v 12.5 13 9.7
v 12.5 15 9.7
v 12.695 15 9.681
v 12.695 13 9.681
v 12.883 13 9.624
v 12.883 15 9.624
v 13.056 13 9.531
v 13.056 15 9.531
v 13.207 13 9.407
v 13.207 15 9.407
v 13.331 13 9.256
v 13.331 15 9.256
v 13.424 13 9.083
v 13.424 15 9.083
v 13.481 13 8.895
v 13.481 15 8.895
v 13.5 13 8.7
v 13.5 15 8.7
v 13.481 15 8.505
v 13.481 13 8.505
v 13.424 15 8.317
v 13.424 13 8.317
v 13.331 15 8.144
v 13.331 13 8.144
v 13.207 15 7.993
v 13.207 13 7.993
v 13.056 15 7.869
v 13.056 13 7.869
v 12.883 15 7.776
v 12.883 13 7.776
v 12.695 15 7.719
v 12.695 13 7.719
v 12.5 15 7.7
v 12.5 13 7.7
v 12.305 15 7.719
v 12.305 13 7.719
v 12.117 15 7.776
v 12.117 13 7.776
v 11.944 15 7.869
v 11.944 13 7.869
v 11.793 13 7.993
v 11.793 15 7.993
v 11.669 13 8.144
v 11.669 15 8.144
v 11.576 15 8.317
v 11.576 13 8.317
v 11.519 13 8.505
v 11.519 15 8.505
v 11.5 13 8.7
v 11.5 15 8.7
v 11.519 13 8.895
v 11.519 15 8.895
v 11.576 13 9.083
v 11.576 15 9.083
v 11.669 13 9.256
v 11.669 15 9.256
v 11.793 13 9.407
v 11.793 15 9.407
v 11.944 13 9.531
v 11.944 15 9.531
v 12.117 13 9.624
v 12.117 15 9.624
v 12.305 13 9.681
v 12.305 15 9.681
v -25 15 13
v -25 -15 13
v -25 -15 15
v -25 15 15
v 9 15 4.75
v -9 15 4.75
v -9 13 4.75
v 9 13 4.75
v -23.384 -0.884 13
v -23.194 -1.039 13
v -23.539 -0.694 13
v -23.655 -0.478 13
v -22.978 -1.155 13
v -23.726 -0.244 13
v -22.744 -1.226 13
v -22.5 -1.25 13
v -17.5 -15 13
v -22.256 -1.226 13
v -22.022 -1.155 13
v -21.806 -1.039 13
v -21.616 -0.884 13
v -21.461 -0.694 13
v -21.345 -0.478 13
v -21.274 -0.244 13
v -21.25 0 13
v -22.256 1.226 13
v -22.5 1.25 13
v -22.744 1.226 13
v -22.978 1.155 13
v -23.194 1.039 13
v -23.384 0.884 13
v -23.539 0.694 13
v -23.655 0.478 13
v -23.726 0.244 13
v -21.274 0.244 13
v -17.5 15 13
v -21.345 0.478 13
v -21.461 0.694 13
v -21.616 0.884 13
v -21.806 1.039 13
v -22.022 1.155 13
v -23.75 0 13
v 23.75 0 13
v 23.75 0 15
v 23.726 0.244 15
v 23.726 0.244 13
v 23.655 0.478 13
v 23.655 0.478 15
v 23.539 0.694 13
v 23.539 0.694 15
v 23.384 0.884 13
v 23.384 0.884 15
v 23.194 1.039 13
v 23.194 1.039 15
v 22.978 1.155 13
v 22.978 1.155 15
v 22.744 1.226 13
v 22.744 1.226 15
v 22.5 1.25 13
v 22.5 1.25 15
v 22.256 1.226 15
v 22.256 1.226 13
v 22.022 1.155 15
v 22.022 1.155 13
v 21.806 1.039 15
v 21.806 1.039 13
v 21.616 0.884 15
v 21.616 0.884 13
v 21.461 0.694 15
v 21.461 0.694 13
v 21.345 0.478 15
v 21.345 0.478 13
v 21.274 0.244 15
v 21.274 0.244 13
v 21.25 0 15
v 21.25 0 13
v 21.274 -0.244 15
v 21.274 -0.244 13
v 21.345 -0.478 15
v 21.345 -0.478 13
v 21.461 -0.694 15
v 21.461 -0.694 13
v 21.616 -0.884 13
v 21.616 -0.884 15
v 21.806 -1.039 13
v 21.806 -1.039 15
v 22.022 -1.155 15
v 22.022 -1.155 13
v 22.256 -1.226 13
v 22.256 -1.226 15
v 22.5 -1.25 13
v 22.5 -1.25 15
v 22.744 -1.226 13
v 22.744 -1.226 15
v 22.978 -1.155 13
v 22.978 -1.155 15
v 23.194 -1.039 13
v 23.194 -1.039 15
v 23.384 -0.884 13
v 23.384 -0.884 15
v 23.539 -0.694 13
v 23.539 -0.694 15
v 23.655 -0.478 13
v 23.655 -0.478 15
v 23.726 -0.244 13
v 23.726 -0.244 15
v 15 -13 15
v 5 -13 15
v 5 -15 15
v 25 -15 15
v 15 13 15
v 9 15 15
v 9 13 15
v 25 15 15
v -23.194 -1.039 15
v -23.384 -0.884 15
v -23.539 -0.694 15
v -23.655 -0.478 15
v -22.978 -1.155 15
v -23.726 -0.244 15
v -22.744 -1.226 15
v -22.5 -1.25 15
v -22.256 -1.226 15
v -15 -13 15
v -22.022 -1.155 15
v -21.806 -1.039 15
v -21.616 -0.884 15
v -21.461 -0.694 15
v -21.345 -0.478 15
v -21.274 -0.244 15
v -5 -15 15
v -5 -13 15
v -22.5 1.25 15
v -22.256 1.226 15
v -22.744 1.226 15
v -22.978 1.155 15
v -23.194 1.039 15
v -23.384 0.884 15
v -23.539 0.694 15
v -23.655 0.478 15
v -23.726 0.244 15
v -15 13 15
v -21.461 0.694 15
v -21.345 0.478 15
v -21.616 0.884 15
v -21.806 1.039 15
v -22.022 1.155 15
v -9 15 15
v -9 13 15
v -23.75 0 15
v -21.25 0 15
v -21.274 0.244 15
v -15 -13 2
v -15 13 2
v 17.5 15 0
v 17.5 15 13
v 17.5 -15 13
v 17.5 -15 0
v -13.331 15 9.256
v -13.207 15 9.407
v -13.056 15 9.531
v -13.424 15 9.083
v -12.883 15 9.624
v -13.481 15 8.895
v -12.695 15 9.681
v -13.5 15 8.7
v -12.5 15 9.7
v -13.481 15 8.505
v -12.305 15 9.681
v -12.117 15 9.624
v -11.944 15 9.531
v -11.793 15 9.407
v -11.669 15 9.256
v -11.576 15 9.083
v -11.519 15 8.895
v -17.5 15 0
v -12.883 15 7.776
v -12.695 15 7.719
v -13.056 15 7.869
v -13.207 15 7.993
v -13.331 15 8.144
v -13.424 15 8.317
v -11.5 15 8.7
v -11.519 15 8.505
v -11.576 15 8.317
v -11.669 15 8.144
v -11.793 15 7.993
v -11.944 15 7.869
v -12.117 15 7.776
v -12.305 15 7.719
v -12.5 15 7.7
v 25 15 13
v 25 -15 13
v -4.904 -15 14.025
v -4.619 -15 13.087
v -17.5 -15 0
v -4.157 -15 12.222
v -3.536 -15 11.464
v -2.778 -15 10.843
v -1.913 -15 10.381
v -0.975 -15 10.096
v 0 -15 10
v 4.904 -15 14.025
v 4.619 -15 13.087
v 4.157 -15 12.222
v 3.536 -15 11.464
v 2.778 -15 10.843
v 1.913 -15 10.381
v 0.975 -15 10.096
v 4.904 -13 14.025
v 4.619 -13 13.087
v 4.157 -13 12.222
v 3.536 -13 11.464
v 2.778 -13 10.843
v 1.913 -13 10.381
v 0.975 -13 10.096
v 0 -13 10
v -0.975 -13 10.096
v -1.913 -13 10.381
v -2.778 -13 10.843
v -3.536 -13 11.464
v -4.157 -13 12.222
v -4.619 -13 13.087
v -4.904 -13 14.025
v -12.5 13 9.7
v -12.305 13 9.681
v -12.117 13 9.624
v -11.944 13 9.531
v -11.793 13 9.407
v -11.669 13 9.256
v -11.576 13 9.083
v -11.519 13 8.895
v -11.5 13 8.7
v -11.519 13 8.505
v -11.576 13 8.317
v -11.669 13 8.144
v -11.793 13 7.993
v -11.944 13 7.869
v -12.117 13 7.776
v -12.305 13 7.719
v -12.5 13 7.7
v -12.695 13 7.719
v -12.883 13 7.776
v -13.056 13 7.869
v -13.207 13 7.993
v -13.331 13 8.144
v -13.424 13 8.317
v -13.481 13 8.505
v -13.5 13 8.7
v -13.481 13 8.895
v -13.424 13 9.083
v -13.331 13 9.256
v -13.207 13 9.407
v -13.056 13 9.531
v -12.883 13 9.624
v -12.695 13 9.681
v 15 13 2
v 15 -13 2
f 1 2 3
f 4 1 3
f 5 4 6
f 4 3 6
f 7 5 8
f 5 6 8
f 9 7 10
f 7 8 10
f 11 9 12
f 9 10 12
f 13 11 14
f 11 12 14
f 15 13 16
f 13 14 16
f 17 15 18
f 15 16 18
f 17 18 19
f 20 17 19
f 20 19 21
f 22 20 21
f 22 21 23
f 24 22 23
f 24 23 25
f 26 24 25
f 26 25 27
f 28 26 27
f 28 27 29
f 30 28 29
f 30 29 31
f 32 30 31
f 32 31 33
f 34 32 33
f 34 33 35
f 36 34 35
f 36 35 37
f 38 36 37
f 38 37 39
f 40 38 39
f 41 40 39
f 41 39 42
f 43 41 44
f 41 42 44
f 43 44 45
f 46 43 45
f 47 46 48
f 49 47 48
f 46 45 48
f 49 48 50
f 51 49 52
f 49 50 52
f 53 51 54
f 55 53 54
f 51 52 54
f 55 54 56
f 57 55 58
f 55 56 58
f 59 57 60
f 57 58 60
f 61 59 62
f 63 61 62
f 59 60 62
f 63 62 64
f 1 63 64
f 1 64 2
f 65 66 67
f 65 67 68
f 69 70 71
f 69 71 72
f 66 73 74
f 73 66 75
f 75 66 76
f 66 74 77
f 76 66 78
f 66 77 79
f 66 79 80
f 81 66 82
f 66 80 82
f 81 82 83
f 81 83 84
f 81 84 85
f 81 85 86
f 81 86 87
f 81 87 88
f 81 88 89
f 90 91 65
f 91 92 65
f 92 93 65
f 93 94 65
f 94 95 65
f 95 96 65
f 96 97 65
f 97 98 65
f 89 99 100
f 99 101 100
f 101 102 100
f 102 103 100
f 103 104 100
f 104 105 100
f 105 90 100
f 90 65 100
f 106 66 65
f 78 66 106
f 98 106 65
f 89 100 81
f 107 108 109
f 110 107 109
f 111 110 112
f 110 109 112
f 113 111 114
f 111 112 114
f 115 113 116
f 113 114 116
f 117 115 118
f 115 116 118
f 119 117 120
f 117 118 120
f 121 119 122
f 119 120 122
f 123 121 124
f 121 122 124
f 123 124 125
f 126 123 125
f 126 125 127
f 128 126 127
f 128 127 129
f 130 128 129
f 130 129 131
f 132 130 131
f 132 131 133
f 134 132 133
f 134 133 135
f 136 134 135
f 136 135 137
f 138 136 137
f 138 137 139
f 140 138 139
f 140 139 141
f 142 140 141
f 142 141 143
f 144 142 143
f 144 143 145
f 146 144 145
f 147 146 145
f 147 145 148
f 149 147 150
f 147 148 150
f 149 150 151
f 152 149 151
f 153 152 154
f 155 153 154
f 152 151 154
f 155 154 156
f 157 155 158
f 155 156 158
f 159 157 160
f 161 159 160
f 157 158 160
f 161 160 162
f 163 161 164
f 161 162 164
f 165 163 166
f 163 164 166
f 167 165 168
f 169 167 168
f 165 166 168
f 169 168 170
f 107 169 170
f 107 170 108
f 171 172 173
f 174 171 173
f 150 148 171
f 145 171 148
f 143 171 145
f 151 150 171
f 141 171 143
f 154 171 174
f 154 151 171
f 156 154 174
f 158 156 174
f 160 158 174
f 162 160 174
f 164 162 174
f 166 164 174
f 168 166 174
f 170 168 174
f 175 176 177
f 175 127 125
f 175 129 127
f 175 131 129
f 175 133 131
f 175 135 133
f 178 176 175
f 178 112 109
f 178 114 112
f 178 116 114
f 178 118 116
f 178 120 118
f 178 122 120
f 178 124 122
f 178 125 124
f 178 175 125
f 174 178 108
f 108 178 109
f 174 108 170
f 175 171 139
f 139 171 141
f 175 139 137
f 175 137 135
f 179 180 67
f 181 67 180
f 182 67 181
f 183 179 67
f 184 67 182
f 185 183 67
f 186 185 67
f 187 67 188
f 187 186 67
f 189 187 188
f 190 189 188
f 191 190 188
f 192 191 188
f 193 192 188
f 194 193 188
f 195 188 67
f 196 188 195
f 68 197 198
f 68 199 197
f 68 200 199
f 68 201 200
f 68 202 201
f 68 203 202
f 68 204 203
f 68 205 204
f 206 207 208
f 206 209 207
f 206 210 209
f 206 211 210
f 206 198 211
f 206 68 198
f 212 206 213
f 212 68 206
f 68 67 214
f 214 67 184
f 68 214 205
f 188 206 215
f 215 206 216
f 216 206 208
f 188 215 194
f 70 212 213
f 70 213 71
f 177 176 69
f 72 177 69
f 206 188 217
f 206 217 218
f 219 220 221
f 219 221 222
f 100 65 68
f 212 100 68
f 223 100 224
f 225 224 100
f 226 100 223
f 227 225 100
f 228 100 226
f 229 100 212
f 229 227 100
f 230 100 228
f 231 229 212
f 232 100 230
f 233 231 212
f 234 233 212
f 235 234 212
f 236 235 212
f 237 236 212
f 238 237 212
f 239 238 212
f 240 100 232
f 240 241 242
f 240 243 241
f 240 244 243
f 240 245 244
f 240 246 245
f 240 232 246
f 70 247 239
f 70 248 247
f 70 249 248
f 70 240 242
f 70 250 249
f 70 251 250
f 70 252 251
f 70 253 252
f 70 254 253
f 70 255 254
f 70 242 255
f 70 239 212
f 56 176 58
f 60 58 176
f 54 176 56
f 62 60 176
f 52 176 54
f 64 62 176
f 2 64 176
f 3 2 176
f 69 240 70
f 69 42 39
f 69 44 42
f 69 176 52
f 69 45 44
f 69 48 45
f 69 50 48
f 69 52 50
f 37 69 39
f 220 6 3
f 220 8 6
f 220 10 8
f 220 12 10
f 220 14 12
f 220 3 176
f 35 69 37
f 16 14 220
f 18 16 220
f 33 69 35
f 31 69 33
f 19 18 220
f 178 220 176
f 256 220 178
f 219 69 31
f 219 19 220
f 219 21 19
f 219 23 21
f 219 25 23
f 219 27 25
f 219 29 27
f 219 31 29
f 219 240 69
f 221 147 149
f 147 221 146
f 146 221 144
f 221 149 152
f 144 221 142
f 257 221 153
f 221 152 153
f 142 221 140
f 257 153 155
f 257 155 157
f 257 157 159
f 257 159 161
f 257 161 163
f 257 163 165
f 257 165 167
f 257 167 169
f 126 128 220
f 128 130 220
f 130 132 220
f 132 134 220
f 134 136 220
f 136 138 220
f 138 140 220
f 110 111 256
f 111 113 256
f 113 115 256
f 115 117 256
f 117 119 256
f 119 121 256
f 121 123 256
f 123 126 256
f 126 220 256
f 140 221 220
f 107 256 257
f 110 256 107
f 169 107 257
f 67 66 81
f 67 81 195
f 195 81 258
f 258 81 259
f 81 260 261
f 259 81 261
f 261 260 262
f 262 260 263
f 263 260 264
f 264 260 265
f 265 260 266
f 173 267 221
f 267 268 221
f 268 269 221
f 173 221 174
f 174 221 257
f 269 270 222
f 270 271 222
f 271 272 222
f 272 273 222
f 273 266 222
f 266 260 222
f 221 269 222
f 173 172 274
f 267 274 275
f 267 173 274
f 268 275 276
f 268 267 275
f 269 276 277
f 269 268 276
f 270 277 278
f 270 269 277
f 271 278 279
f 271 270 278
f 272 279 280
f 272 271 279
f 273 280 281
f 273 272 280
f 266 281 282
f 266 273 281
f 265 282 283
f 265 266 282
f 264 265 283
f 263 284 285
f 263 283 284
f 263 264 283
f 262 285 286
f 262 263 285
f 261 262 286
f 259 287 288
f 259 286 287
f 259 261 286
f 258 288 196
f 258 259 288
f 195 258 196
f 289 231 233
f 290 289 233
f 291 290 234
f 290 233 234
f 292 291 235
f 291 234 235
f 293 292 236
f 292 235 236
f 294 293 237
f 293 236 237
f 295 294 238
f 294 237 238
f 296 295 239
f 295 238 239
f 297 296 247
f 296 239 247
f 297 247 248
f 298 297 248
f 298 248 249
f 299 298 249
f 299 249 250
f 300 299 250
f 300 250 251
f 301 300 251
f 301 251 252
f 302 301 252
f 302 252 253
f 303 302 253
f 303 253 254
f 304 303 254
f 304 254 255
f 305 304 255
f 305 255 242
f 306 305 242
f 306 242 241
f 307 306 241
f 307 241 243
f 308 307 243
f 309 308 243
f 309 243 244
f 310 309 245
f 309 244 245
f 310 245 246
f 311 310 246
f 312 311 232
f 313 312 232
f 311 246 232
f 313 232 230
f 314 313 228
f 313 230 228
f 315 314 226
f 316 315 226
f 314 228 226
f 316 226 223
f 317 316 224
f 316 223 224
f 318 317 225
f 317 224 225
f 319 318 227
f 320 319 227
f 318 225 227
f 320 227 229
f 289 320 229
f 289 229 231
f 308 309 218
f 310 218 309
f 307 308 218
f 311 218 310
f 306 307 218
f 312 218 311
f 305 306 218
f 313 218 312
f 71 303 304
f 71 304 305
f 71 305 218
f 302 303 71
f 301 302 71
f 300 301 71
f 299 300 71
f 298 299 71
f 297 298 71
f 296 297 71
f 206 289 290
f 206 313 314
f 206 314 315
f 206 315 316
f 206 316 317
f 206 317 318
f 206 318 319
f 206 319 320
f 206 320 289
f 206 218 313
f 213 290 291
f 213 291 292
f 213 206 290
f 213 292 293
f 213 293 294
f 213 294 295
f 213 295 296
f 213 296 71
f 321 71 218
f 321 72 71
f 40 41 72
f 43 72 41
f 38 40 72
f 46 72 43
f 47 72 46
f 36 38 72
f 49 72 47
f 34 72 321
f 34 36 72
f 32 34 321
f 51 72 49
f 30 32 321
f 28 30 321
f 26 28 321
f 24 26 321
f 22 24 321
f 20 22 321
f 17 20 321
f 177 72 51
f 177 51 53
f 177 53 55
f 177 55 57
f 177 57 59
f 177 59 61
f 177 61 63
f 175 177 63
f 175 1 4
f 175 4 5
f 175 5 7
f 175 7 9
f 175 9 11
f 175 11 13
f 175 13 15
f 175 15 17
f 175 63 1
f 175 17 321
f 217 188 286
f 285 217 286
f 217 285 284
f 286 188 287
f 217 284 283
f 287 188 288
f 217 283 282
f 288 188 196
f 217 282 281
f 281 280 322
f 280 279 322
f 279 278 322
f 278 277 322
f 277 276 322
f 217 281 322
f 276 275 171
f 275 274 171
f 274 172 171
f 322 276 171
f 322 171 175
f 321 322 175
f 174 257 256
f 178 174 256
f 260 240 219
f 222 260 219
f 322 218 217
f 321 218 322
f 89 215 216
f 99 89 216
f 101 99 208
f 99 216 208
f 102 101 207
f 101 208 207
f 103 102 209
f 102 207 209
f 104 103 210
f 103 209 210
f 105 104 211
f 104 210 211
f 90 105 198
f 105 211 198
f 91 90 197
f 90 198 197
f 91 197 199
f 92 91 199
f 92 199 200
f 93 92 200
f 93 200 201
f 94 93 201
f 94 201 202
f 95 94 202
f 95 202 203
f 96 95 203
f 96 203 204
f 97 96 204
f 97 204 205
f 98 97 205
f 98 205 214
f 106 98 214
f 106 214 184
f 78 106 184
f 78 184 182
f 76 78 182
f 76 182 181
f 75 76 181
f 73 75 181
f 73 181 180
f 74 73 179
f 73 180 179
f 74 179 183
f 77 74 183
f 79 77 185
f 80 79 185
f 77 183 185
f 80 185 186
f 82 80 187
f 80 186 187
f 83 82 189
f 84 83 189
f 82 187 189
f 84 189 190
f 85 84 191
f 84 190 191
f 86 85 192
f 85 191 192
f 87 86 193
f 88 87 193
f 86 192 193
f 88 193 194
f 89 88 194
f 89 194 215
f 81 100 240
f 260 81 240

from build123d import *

# Parameters (mm, degrees)
SKETCH_1_W             = 50
SKETCH_1_H             = 30
EXTRUDE_1_DEPTH        = 15
SKETCH_2_W             = 18
SKETCH_2_H             = 10.25
CUT_EXTRUDE_1_DEPTH    = 5
SKETCH_3_W             = 30
SKETCH_3_H             = 26
CUT_EXTRUDE_2_DEPTH    = 13
SKETCH_4_W             = 7.5
SKETCH_4_H             = 13
CUT_EXTRUDE_3_DEPTH    = 50
SKETCH_5_W             = 7.5
SKETCH_5_H             = 13
CUT_EXTRUDE_4_DEPTH    = 50
CUT_EXTRUDE_5_DEPTH    = 50
SKETCH_7_R             = 1.25
CUT_EXTRUDE_6_DEPTH    = 50
PATTERN_LINEAR_1_COUNT = 2
PATTERN_LINEAR_1_PITCH = 45
SKETCH_8_R             = 1
CUT_EXTRUDE_7_DEPTH    = 5
PATTERN_LINEAR_2_COUNT = 2
PATTERN_LINEAR_2_PITCH = 25


with BuildPart() as part:
    # Эскиз1 → Бобышка-Вытянуть1 (new body)
    with BuildSketch(Plane.XY):
        Rectangle(SKETCH_1_W, SKETCH_1_H)
    extrude(amount=EXTRUDE_1_DEPTH)

    # Эскиз2 → Вырез-Вытянуть1 (cut)
    with BuildSketch(Plane(origin=(0, 15, 0), x_dir=(1, 0, 0), z_dir=(0, 1, 0))):
        with Locations((0, -9.875)):
            Rectangle(SKETCH_2_W, SKETCH_2_H)
    extrude(amount=-CUT_EXTRUDE_1_DEPTH, mode=Mode.SUBTRACT)

    # Эскиз3 → Вырез-Вытянуть2 (cut)
    with BuildSketch(Plane.XY.offset(15)):
        Rectangle(SKETCH_3_W, SKETCH_3_H)
    extrude(amount=-CUT_EXTRUDE_2_DEPTH, mode=Mode.SUBTRACT)

    # Эскиз4 → Вырез-Вытянуть3 (cut)
    with BuildSketch(Plane(origin=(0, 15, 0), x_dir=(1, 0, 0), z_dir=(0, 1, 0))):
        with Locations((-21.25, -6.5)):
            Rectangle(SKETCH_4_W, SKETCH_4_H)
    extrude(amount=-CUT_EXTRUDE_3_DEPTH, mode=Mode.SUBTRACT)

    # Эскиз5 → Вырез-Вытянуть4 (cut)
    with BuildSketch(Plane(origin=(0, 15, 0), x_dir=(1, 0, 0), z_dir=(0, 1, 0))):
        with Locations((21.25, -6.5)):
            Rectangle(SKETCH_5_W, SKETCH_5_H)
    extrude(amount=-CUT_EXTRUDE_4_DEPTH, mode=Mode.SUBTRACT)

    # Эскиз6 → Вырез-Вытянуть5 (cut)
    with BuildSketch(Plane.XZ.offset(15)):
        with BuildLine():
            Line((-5, 15), (5, 15))
            ThreePointArc((5, 15), (0, 10), (-5, 15))
        make_face()
    extrude(amount=-CUT_EXTRUDE_5_DEPTH, mode=Mode.SUBTRACT)

    # Эскиз7 → Вырез-Вытянуть6 (cut)
    with BuildSketch(Plane.XY.offset(15)):
        with Locations((22.5, 0)):
            Circle(SKETCH_7_R)
    cut_extrude_6 = extrude(amount=-CUT_EXTRUDE_6_DEPTH, mode=Mode.SUBTRACT)

    # Линейный массив1: Вырез-Вытянуть6 ×2
    with Locations(*[(-i * PATTERN_LINEAR_1_PITCH, 0, 0) for i in range(1, PATTERN_LINEAR_1_COUNT)]):
        add(cut_extrude_6, mode=Mode.SUBTRACT)

    # Эскиз8 → Вырез-Вытянуть7 (cut)
    with BuildSketch(Plane(origin=(0, 15, 0), x_dir=(1, 0, 0), z_dir=(0, 1, 0))):
        with Locations(Location((-12.5, -8.7, 0), (0, 0, 270))):
            Circle(SKETCH_8_R)
    cut_extrude_7 = extrude(amount=-CUT_EXTRUDE_7_DEPTH, mode=Mode.SUBTRACT)

    # Линейный массив2: Вырез-Вытянуть7 ×2
    with Locations(*[(i * PATTERN_LINEAR_2_PITCH, 0, 0) for i in range(1, PATTERN_LINEAR_2_COUNT)]):
        add(cut_extrude_7, mode=Mode.SUBTRACT)


solid = part.part
